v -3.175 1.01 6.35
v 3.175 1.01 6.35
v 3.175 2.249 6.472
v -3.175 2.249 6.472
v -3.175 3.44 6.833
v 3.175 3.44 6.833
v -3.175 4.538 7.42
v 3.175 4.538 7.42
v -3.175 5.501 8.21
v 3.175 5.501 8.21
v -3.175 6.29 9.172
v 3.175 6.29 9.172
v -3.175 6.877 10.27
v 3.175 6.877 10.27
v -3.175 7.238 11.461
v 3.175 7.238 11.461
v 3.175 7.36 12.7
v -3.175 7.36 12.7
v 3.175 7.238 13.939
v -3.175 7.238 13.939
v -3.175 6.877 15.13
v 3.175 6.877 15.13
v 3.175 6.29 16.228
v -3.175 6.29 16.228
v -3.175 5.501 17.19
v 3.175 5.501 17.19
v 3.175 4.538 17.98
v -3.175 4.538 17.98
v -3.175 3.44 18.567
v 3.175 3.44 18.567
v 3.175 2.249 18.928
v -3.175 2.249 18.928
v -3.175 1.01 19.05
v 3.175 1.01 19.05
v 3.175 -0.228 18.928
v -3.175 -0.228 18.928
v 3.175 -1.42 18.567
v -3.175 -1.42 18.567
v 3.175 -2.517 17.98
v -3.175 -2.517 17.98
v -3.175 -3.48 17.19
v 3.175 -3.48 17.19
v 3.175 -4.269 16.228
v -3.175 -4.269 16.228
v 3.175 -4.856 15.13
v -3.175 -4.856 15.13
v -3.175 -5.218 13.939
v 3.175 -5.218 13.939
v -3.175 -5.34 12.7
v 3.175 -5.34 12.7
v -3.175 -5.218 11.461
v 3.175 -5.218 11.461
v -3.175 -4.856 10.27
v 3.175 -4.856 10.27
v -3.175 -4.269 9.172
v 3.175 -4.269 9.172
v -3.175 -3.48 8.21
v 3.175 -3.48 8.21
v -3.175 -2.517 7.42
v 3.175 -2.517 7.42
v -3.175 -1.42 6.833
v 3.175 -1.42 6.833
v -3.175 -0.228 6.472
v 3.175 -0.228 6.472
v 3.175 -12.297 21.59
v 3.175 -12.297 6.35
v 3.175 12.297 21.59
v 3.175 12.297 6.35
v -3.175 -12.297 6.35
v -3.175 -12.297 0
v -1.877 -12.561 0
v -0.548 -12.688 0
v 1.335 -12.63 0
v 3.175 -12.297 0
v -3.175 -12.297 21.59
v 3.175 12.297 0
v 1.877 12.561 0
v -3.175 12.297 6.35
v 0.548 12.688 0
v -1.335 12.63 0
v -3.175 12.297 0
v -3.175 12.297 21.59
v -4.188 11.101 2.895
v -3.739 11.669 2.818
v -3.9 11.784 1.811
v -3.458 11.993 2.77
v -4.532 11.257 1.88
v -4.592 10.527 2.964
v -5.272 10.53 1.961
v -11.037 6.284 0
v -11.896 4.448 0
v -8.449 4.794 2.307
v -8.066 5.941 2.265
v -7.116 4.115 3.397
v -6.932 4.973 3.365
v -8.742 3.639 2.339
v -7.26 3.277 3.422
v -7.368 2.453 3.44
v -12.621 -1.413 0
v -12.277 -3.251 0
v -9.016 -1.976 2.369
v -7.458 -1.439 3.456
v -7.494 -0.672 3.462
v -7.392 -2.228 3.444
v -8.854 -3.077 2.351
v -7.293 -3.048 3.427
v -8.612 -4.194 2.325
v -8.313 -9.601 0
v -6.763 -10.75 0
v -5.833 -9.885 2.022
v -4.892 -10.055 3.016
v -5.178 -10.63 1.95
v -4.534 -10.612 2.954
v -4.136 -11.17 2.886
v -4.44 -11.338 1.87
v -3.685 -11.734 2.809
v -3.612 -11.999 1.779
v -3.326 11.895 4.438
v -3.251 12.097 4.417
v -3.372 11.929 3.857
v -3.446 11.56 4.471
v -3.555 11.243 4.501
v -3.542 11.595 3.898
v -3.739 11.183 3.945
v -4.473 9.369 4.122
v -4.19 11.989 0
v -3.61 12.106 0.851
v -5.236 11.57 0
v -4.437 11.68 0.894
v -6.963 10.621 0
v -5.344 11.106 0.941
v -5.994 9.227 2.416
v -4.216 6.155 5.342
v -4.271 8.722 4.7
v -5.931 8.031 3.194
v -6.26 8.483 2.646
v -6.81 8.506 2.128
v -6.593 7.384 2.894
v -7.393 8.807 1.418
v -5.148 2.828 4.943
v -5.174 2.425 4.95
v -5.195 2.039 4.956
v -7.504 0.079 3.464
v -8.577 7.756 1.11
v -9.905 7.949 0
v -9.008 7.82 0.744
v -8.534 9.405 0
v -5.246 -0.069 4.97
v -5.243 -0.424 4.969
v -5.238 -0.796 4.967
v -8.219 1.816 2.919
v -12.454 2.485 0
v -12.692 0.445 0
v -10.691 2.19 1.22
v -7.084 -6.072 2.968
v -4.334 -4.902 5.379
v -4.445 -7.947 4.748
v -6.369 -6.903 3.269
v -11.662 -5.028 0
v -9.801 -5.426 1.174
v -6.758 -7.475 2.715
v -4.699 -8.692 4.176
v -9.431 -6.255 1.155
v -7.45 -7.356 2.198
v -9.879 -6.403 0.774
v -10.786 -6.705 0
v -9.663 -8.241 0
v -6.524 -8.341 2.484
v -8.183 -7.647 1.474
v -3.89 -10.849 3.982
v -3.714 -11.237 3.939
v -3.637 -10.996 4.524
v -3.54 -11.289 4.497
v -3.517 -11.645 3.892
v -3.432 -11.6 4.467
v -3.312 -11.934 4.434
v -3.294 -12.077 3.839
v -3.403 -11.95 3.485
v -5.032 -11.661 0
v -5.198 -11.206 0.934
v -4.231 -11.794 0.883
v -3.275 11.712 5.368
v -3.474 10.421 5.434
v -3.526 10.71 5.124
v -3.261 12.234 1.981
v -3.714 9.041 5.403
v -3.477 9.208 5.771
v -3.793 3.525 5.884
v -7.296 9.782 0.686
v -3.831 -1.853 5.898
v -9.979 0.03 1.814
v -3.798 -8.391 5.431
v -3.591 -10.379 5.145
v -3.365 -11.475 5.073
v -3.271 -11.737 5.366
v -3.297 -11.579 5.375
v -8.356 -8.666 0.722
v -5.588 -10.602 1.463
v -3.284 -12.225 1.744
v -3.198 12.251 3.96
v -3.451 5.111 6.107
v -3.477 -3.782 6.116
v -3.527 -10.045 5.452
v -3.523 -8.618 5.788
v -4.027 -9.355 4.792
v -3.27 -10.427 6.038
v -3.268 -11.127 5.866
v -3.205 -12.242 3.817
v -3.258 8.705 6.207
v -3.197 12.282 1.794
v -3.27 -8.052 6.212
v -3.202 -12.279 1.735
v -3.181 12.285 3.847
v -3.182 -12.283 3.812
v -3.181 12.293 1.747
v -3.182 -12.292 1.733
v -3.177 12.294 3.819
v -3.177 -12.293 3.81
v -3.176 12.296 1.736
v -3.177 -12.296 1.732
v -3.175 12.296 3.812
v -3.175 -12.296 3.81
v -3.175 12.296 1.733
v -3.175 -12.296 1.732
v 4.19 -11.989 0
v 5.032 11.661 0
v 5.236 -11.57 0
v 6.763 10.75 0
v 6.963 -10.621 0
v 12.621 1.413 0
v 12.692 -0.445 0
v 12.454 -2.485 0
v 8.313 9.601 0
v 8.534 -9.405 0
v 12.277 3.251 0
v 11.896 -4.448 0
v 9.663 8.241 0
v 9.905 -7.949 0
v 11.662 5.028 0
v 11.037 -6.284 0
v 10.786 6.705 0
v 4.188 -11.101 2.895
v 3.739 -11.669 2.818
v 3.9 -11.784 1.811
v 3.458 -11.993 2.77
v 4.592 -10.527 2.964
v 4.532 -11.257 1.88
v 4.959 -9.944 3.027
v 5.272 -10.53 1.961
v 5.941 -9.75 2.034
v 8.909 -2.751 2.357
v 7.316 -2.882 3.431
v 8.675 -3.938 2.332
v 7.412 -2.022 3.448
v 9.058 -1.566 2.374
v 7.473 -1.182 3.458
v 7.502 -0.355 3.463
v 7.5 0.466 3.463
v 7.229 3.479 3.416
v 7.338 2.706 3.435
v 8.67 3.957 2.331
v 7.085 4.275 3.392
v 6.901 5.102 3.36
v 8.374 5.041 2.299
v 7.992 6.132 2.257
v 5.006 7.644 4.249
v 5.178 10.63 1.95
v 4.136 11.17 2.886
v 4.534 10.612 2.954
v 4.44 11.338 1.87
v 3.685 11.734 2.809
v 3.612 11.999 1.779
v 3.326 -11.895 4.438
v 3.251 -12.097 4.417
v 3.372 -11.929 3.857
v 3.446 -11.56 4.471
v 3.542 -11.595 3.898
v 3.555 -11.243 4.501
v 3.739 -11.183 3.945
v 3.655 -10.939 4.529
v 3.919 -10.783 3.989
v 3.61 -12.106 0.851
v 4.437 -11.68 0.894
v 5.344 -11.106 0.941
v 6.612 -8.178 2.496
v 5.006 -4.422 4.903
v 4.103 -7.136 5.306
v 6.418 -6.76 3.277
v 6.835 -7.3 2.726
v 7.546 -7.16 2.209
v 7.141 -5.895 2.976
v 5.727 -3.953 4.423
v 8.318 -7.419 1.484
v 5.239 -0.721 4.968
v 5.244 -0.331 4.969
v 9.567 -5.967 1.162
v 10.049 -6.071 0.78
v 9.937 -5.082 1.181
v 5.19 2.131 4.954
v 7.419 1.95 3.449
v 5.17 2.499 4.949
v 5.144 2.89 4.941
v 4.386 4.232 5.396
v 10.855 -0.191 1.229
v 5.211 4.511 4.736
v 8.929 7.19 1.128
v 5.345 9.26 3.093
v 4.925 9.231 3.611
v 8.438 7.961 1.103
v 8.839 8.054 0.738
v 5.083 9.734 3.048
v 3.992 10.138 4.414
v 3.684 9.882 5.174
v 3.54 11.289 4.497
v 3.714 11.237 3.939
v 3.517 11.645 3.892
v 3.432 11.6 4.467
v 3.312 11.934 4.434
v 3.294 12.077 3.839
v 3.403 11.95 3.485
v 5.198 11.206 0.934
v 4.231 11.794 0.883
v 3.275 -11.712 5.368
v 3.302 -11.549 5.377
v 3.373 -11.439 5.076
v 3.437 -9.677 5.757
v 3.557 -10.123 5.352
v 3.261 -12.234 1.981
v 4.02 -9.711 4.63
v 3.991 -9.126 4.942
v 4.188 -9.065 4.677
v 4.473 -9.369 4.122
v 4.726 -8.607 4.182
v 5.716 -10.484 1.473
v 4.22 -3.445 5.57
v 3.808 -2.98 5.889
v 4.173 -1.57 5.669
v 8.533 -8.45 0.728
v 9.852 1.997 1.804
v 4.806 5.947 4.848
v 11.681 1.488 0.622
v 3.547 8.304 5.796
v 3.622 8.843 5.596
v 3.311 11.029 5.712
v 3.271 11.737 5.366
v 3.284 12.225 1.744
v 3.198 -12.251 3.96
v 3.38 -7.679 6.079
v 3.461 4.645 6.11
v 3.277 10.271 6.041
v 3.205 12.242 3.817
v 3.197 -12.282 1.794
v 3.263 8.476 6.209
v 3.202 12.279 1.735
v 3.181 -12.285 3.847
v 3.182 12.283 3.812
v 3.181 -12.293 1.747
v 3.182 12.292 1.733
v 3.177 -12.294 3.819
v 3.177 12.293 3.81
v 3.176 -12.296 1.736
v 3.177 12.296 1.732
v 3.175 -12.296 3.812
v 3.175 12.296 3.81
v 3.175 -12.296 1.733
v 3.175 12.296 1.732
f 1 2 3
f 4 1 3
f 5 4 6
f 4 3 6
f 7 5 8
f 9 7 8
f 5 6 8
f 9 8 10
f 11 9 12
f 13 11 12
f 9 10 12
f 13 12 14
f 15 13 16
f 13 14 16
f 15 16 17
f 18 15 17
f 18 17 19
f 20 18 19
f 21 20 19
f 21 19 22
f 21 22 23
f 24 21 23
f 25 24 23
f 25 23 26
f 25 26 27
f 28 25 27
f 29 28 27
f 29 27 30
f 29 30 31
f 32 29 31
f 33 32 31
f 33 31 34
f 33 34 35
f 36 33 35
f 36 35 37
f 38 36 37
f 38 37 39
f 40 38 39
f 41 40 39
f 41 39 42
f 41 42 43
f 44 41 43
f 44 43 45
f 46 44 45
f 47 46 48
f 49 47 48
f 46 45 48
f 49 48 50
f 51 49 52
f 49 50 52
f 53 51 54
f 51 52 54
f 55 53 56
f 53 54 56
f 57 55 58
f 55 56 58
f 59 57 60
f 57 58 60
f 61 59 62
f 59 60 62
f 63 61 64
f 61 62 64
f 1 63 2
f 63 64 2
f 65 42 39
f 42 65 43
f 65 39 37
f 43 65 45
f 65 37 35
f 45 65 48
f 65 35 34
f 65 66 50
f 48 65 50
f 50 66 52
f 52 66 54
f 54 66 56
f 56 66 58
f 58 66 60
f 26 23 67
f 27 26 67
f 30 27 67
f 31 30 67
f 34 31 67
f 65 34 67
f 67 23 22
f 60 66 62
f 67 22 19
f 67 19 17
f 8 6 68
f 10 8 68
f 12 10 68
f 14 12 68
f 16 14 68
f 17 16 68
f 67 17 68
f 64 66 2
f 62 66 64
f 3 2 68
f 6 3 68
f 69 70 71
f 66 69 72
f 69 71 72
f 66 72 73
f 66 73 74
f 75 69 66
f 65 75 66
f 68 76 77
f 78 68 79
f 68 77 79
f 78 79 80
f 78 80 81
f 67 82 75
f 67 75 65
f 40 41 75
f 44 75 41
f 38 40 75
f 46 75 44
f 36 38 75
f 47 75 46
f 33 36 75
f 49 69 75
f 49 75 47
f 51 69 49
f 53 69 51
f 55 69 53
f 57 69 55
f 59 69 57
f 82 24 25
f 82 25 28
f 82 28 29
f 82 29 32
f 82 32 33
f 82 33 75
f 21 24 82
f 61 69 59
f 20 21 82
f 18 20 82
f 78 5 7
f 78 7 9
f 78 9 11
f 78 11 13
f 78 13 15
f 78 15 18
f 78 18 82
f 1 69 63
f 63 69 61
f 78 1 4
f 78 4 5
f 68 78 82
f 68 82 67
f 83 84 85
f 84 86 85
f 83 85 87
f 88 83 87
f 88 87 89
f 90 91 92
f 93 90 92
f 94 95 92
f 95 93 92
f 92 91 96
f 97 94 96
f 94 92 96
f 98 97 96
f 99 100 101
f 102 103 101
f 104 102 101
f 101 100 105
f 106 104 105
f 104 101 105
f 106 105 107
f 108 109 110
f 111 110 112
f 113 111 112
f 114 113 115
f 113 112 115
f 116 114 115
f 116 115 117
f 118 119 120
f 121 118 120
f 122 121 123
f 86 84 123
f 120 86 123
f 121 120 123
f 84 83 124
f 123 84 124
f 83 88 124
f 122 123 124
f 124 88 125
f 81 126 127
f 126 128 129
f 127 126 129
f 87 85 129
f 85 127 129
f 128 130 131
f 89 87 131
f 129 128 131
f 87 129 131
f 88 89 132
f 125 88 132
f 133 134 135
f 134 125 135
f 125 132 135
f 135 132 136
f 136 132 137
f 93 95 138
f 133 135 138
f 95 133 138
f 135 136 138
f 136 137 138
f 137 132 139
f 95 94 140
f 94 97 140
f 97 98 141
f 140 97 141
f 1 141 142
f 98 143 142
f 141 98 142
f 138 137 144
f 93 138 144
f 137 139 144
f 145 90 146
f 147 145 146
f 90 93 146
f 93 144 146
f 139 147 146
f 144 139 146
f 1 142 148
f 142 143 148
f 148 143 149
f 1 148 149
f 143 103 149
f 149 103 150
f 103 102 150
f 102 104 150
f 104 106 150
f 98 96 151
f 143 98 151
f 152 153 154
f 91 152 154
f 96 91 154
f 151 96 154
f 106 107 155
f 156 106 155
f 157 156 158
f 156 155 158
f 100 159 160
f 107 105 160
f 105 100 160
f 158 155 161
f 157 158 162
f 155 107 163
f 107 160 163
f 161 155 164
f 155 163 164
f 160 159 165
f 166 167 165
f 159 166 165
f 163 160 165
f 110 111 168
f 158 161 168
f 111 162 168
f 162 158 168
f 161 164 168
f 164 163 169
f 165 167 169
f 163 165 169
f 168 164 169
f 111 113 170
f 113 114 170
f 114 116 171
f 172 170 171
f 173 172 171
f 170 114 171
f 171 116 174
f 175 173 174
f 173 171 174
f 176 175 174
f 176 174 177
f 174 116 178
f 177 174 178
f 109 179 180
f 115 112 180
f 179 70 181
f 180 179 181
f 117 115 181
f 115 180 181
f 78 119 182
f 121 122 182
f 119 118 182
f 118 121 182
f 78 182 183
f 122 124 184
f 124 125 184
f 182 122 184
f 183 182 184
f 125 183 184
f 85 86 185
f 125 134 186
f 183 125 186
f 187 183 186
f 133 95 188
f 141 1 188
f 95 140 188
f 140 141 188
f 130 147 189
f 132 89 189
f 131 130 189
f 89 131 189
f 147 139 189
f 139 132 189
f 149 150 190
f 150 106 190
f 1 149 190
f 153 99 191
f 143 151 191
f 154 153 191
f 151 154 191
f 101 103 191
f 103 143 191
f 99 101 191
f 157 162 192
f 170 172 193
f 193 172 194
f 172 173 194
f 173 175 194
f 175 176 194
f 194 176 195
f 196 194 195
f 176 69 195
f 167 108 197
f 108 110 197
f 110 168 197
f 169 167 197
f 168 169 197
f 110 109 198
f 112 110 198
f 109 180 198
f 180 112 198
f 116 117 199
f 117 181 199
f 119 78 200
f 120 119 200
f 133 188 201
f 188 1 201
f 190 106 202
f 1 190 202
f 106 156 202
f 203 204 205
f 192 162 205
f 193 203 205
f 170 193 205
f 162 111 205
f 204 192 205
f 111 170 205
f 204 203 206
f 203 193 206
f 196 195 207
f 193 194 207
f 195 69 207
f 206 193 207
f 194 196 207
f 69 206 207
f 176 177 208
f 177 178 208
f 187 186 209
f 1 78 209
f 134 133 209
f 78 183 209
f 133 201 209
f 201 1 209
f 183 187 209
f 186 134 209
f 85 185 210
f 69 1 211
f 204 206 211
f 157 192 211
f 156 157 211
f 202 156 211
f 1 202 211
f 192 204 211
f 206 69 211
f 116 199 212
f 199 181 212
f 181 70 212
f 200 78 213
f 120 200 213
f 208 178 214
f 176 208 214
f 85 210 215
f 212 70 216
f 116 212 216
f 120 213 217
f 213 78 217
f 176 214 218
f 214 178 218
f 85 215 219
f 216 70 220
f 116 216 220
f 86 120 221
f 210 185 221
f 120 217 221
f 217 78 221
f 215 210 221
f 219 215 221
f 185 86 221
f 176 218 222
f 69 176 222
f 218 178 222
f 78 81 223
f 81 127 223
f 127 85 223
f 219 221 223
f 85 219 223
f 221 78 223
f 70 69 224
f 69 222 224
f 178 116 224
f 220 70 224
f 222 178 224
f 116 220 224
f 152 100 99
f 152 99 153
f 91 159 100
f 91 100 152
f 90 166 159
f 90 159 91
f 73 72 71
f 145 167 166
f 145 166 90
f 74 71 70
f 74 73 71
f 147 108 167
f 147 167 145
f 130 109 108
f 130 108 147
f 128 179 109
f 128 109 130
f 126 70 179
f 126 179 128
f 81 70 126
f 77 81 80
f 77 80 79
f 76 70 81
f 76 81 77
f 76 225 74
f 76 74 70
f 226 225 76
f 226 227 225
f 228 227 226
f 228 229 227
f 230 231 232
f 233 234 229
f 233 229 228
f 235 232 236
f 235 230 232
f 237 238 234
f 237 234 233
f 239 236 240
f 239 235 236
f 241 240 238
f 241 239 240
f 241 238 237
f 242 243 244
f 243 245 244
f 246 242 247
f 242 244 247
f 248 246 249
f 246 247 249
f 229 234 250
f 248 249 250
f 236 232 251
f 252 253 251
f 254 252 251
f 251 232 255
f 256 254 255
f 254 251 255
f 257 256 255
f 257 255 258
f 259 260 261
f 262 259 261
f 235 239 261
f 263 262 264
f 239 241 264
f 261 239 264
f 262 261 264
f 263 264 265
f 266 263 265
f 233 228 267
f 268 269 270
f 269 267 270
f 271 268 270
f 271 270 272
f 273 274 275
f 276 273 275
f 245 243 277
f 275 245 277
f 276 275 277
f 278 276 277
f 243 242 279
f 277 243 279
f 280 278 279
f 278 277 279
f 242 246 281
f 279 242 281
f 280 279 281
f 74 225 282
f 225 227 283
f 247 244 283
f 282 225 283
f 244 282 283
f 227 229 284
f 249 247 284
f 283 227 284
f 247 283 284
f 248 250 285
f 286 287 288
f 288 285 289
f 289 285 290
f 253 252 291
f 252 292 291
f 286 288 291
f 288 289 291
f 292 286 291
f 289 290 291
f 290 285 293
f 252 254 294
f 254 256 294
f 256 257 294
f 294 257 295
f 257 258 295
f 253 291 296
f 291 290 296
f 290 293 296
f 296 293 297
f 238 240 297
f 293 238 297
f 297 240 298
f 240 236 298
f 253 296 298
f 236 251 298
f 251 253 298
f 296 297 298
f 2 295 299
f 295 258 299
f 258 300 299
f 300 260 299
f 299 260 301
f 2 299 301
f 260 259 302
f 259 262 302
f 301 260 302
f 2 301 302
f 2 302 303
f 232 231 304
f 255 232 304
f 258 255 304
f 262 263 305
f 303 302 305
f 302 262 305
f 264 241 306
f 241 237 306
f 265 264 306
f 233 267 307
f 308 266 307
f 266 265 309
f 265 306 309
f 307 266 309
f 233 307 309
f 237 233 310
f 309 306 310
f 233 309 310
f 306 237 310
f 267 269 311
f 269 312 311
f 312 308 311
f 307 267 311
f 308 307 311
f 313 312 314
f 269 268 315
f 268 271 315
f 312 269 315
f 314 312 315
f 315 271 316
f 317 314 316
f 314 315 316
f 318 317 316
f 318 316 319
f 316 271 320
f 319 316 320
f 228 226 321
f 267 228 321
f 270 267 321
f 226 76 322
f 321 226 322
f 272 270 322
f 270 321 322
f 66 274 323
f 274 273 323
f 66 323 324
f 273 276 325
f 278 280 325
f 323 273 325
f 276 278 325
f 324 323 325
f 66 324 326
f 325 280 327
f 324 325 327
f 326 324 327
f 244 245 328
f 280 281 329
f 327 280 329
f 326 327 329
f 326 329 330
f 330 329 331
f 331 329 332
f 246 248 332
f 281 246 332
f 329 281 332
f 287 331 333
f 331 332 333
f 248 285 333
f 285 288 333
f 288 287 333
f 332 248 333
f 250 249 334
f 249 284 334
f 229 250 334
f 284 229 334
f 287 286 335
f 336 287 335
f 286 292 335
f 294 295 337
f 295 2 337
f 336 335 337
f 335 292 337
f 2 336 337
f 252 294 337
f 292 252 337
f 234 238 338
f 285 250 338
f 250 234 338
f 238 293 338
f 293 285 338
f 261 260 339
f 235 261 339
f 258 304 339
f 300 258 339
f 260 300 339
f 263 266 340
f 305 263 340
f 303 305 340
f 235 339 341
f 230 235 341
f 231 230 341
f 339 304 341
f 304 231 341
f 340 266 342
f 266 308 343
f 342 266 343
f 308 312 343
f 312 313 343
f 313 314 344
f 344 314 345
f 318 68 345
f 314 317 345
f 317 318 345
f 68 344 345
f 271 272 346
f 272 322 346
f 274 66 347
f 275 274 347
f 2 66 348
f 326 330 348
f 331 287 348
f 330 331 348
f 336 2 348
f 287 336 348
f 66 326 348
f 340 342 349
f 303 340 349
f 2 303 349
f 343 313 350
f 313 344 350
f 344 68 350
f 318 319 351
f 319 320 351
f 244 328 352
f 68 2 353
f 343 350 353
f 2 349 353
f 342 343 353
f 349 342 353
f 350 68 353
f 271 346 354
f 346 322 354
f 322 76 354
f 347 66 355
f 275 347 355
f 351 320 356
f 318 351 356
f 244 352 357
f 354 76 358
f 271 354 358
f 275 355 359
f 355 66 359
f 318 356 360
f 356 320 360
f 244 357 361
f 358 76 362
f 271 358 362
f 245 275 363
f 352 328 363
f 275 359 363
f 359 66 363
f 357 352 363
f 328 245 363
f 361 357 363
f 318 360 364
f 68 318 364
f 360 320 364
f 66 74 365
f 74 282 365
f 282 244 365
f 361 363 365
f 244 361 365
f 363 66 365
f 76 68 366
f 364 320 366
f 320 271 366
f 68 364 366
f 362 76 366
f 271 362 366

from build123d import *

# Parameters (mm, degrees)
SKETCH2_W           = 6.35
SKETCH2_H           = 24.593444248
SKETCH3_W           = 6.35
SKETCH3_H           = 24.593444248
BOSS_EXTRUDE1_DEPTH = 15.24
SKETCH4_R           = 6.35
CUT_EXTRUDE1_DEPTH  = 30.655247945


with BuildPart() as part:
    # Sketch2 → Loft1 section 0
    with BuildSketch(Plane.XY.offset(6.35)):
        Rectangle(SKETCH2_W, SKETCH2_H)
    # Sketch1 for Loft1 → Loft1 section 1
    with BuildSketch(Plane.XY):
        with BuildLine():
            # circular arc as an exact rational Bezier (weights 1, cos(half-angle), 1)
            Bezier((-3.175, 12.296722124), (0, 13.116503599), (3.175, 12.296722124), weights=[1, 0.968245837, 1])
            Bezier((3.175, 12.296722124), (50.800000002, 0), (3.175, -12.296722124), weights=[1, 0.25, 1])
            Bezier((3.175, -12.296722124), (0, -13.116503599), (-3.175, -12.296722124), weights=[1, 0.968245837, 1])
            Bezier((-3.175, -12.296722124), (-50.800000002, 0), (-3.175, 12.296722124), weights=[1, 0.25, 1])
        make_face()
    loft()

    # Sketch3 → Boss-Extrude1 (add)
    with BuildSketch(Plane.XY.offset(6.35)):
        Rectangle(SKETCH3_W, SKETCH3_H)
    extrude(amount=BOSS_EXTRUDE1_DEPTH)

    # Sketch4 → Cut-Extrude1 (cut, through all)
    with BuildSketch(Plane(origin=(3.175, 0, 0), x_dir=(0, 0, -1), z_dir=(1, 0, 0))):
        with Locations((-12.7, 1.010428855)):
            Circle(SKETCH4_R)
    extrude(amount=-CUT_EXTRUDE1_DEPTH, mode=Mode.SUBTRACT)


solid = part.part
